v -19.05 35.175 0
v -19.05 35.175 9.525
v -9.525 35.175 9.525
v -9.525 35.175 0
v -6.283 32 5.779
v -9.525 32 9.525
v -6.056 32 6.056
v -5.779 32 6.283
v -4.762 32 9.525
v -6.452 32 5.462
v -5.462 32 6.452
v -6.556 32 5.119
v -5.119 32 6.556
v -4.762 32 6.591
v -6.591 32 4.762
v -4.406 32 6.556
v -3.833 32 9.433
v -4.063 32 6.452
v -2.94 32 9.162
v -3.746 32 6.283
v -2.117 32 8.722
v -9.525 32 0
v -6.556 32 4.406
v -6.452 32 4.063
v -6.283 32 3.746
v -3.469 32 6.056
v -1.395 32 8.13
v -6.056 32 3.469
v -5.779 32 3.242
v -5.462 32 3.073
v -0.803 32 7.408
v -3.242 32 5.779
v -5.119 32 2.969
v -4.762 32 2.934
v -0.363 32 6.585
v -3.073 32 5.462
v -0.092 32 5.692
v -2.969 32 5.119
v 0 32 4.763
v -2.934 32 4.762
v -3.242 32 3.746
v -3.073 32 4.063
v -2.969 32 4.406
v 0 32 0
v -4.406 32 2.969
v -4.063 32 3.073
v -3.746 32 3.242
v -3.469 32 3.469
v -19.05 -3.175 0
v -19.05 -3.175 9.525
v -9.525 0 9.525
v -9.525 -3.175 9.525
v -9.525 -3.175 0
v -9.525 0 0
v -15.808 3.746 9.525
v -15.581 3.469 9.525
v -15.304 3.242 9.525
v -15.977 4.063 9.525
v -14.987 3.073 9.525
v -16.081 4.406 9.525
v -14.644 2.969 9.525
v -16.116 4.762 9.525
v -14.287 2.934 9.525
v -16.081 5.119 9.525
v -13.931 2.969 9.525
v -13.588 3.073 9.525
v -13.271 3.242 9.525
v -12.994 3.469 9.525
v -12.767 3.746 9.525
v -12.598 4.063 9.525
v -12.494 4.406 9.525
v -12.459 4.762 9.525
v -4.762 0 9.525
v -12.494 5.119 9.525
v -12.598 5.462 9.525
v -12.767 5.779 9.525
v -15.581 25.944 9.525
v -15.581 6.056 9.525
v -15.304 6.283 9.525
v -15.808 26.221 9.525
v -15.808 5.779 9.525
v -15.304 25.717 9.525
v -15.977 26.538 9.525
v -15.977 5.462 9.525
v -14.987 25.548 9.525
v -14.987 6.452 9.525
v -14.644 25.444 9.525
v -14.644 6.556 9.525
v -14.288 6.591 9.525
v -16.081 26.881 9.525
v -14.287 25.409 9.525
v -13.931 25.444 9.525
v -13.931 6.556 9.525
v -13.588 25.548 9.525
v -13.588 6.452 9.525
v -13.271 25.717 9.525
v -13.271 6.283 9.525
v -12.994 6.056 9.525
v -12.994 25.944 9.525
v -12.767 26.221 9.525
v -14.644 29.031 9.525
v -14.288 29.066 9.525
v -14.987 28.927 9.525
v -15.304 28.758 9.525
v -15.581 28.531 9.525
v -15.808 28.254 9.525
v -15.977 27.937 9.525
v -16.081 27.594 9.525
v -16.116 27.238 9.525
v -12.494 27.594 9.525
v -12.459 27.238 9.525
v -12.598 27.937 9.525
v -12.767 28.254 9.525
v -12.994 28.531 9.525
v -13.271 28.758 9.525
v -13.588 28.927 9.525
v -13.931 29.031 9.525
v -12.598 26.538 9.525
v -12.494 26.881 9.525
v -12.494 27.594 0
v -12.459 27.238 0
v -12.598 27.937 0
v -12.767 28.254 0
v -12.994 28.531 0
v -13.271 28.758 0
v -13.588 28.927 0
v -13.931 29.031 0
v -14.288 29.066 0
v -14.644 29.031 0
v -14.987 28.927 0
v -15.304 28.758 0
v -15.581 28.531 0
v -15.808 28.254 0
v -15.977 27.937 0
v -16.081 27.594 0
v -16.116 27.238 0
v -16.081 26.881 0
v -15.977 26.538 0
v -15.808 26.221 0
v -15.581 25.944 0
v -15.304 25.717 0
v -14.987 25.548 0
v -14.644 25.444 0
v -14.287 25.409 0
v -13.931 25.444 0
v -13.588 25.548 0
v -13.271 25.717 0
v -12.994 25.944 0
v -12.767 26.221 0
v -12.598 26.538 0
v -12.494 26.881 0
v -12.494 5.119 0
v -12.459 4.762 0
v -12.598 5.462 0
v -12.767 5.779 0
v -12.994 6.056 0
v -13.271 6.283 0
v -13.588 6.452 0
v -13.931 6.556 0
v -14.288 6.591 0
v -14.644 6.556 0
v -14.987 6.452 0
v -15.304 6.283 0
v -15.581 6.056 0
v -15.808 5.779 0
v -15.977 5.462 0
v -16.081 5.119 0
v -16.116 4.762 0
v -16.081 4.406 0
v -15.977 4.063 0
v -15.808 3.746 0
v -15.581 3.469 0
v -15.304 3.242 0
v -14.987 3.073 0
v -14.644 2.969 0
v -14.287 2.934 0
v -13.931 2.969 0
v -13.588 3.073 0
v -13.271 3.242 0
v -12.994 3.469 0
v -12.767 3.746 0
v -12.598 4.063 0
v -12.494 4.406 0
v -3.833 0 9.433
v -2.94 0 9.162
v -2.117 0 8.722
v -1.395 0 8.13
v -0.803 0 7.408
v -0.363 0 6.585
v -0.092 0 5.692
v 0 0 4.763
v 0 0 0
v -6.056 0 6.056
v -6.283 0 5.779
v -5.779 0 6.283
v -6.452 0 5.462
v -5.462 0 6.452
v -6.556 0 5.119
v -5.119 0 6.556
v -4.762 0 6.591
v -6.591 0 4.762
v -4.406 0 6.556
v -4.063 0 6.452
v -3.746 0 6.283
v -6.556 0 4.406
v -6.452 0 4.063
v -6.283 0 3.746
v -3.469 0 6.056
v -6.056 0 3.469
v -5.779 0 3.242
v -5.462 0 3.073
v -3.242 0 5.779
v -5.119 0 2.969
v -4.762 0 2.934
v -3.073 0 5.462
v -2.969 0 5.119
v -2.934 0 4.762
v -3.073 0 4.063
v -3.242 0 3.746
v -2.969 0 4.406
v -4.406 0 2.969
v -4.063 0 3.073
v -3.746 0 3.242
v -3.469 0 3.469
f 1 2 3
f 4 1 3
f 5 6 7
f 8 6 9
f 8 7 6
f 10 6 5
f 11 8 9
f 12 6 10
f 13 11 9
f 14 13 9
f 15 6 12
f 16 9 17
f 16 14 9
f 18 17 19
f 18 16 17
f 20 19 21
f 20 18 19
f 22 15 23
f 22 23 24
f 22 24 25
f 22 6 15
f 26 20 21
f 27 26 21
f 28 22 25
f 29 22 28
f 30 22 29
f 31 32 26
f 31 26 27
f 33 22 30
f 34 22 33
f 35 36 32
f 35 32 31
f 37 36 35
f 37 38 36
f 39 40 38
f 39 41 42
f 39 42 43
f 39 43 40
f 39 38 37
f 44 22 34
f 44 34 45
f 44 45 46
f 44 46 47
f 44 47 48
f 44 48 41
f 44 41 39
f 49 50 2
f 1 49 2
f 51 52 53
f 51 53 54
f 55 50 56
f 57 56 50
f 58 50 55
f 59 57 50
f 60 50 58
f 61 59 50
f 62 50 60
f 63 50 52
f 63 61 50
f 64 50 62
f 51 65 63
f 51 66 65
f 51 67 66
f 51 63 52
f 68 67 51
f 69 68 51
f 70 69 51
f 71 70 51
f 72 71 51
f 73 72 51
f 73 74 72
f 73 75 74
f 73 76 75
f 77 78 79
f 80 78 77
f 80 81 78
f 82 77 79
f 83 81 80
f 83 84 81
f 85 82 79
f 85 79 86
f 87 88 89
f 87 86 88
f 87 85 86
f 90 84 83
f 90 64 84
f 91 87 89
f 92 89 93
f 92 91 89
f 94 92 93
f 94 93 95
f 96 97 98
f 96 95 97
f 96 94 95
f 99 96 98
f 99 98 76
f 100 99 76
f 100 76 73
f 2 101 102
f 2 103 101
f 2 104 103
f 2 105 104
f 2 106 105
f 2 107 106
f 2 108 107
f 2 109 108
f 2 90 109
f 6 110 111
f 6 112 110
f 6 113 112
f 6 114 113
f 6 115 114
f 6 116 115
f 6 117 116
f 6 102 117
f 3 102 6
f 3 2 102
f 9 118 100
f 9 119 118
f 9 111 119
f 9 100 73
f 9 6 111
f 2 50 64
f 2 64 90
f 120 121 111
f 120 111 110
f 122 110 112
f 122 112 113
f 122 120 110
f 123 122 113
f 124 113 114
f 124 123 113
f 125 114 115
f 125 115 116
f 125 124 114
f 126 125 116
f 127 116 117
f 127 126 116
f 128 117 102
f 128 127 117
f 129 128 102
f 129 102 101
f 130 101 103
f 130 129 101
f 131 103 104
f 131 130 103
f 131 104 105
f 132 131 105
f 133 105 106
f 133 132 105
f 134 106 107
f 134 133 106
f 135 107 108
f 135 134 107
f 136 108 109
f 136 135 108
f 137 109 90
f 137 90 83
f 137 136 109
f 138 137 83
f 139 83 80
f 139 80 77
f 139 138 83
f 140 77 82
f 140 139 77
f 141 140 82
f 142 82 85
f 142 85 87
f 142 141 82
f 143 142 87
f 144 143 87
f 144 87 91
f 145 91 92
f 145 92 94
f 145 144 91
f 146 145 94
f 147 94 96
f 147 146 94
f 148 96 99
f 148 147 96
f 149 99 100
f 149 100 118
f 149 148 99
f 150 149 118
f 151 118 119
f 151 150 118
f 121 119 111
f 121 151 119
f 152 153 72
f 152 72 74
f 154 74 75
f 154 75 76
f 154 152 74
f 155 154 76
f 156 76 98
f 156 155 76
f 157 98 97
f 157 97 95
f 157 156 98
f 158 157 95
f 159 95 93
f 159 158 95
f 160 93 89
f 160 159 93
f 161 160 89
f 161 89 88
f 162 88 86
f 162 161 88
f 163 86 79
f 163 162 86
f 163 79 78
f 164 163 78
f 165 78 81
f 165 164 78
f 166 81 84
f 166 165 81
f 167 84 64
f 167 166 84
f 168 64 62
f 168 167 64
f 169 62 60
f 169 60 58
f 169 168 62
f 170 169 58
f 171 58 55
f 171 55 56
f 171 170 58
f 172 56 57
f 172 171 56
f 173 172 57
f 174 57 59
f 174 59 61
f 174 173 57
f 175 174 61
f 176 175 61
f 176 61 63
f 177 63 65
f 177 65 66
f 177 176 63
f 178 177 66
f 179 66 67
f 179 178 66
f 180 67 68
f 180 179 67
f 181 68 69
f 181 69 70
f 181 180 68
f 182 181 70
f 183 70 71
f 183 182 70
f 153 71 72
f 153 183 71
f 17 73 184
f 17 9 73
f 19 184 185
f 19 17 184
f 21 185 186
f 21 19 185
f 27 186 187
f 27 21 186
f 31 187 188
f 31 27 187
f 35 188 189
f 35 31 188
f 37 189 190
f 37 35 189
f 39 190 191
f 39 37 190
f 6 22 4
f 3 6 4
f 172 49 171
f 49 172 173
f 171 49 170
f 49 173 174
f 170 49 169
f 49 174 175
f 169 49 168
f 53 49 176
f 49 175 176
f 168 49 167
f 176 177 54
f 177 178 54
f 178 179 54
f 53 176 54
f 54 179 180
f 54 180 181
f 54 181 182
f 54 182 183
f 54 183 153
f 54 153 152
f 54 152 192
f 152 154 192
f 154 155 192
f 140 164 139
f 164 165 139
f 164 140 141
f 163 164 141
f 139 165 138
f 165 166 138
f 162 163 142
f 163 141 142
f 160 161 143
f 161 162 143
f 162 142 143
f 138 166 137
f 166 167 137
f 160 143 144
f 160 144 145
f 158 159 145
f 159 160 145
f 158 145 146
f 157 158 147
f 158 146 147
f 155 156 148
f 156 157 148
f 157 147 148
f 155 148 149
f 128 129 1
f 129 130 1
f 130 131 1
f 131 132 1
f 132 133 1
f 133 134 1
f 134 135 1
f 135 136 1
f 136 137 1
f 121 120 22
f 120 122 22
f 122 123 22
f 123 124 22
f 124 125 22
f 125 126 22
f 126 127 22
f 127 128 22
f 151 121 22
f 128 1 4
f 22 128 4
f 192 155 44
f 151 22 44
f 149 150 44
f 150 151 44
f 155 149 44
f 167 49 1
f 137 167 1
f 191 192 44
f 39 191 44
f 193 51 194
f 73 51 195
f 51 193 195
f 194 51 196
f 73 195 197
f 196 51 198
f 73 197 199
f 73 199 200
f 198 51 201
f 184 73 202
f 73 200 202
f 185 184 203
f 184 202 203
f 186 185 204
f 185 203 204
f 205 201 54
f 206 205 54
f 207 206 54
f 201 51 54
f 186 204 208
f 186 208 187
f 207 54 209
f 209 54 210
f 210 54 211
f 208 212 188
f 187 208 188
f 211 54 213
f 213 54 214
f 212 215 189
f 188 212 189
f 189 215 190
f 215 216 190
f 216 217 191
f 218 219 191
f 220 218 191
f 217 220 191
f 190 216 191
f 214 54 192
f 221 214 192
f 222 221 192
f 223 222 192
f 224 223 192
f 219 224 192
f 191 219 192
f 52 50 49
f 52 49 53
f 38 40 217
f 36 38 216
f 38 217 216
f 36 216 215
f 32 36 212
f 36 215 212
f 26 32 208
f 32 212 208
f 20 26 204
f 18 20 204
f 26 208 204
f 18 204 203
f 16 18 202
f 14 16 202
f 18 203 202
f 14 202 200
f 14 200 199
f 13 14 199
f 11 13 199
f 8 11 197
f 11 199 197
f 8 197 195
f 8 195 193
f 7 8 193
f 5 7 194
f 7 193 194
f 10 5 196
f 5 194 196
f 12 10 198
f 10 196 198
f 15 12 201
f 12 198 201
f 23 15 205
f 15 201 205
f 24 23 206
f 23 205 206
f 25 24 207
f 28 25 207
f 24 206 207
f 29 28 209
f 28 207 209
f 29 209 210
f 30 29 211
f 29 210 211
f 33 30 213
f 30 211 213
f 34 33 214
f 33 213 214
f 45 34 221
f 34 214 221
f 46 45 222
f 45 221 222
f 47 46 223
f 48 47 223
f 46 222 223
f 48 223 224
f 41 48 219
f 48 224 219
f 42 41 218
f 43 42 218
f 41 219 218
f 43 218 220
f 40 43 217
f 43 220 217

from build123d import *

# Parameters (mm, degrees)
F0_W     = 19.05
F0_H     = 32
F0_R     = 1.8288
F1_DEPTH = 9.525
F2_R     = 1.8288
F3_DEPTH = 32
F4_R     = 4.7625
F5_W     = 9.525
F5_H     = 3.175
F6_DEPTH = 9.525


with BuildPart() as f1:
    # F0 (on Top) → F1 (new body)
    with BuildSketch(Plane.XY):
        with Locations((-9.525, 16)):
            Rectangle(F0_W, F0_H)
        with Locations((-14.2875, 4.7625)):
            Circle(F0_R, mode=Mode.SUBTRACT)
        with Locations((-14.2875, 27.2375)):
            Circle(F0_R, mode=Mode.SUBTRACT)
    extrude(amount=F1_DEPTH)

    # F2 (on face) → F3 (cut, through all)
    with BuildSketch(Plane.XZ):
        with Locations((-4.7625, 4.7625)):
            Circle(F2_R)
    extrude(amount=-F3_DEPTH, mode=Mode.SUBTRACT)

    # F4
    f4_edges = [f1.edges().sort_by_distance(p)[0] for p in [
        (0, 16, 9.525),
    ]]
    fillet(f4_edges, radius=F4_R)

    # F5 (on face) → F6 (join, through all)
    with BuildSketch(Plane.XY.offset(9.525)):
        with Locations((-14.2875, 33.5875)):
            Rectangle(F5_W, F5_H)
        with Locations((-14.2875, -1.5875)):
            Rectangle(F5_W, F5_H)
    extrude(amount=-F6_DEPTH)


solid = f1.part
